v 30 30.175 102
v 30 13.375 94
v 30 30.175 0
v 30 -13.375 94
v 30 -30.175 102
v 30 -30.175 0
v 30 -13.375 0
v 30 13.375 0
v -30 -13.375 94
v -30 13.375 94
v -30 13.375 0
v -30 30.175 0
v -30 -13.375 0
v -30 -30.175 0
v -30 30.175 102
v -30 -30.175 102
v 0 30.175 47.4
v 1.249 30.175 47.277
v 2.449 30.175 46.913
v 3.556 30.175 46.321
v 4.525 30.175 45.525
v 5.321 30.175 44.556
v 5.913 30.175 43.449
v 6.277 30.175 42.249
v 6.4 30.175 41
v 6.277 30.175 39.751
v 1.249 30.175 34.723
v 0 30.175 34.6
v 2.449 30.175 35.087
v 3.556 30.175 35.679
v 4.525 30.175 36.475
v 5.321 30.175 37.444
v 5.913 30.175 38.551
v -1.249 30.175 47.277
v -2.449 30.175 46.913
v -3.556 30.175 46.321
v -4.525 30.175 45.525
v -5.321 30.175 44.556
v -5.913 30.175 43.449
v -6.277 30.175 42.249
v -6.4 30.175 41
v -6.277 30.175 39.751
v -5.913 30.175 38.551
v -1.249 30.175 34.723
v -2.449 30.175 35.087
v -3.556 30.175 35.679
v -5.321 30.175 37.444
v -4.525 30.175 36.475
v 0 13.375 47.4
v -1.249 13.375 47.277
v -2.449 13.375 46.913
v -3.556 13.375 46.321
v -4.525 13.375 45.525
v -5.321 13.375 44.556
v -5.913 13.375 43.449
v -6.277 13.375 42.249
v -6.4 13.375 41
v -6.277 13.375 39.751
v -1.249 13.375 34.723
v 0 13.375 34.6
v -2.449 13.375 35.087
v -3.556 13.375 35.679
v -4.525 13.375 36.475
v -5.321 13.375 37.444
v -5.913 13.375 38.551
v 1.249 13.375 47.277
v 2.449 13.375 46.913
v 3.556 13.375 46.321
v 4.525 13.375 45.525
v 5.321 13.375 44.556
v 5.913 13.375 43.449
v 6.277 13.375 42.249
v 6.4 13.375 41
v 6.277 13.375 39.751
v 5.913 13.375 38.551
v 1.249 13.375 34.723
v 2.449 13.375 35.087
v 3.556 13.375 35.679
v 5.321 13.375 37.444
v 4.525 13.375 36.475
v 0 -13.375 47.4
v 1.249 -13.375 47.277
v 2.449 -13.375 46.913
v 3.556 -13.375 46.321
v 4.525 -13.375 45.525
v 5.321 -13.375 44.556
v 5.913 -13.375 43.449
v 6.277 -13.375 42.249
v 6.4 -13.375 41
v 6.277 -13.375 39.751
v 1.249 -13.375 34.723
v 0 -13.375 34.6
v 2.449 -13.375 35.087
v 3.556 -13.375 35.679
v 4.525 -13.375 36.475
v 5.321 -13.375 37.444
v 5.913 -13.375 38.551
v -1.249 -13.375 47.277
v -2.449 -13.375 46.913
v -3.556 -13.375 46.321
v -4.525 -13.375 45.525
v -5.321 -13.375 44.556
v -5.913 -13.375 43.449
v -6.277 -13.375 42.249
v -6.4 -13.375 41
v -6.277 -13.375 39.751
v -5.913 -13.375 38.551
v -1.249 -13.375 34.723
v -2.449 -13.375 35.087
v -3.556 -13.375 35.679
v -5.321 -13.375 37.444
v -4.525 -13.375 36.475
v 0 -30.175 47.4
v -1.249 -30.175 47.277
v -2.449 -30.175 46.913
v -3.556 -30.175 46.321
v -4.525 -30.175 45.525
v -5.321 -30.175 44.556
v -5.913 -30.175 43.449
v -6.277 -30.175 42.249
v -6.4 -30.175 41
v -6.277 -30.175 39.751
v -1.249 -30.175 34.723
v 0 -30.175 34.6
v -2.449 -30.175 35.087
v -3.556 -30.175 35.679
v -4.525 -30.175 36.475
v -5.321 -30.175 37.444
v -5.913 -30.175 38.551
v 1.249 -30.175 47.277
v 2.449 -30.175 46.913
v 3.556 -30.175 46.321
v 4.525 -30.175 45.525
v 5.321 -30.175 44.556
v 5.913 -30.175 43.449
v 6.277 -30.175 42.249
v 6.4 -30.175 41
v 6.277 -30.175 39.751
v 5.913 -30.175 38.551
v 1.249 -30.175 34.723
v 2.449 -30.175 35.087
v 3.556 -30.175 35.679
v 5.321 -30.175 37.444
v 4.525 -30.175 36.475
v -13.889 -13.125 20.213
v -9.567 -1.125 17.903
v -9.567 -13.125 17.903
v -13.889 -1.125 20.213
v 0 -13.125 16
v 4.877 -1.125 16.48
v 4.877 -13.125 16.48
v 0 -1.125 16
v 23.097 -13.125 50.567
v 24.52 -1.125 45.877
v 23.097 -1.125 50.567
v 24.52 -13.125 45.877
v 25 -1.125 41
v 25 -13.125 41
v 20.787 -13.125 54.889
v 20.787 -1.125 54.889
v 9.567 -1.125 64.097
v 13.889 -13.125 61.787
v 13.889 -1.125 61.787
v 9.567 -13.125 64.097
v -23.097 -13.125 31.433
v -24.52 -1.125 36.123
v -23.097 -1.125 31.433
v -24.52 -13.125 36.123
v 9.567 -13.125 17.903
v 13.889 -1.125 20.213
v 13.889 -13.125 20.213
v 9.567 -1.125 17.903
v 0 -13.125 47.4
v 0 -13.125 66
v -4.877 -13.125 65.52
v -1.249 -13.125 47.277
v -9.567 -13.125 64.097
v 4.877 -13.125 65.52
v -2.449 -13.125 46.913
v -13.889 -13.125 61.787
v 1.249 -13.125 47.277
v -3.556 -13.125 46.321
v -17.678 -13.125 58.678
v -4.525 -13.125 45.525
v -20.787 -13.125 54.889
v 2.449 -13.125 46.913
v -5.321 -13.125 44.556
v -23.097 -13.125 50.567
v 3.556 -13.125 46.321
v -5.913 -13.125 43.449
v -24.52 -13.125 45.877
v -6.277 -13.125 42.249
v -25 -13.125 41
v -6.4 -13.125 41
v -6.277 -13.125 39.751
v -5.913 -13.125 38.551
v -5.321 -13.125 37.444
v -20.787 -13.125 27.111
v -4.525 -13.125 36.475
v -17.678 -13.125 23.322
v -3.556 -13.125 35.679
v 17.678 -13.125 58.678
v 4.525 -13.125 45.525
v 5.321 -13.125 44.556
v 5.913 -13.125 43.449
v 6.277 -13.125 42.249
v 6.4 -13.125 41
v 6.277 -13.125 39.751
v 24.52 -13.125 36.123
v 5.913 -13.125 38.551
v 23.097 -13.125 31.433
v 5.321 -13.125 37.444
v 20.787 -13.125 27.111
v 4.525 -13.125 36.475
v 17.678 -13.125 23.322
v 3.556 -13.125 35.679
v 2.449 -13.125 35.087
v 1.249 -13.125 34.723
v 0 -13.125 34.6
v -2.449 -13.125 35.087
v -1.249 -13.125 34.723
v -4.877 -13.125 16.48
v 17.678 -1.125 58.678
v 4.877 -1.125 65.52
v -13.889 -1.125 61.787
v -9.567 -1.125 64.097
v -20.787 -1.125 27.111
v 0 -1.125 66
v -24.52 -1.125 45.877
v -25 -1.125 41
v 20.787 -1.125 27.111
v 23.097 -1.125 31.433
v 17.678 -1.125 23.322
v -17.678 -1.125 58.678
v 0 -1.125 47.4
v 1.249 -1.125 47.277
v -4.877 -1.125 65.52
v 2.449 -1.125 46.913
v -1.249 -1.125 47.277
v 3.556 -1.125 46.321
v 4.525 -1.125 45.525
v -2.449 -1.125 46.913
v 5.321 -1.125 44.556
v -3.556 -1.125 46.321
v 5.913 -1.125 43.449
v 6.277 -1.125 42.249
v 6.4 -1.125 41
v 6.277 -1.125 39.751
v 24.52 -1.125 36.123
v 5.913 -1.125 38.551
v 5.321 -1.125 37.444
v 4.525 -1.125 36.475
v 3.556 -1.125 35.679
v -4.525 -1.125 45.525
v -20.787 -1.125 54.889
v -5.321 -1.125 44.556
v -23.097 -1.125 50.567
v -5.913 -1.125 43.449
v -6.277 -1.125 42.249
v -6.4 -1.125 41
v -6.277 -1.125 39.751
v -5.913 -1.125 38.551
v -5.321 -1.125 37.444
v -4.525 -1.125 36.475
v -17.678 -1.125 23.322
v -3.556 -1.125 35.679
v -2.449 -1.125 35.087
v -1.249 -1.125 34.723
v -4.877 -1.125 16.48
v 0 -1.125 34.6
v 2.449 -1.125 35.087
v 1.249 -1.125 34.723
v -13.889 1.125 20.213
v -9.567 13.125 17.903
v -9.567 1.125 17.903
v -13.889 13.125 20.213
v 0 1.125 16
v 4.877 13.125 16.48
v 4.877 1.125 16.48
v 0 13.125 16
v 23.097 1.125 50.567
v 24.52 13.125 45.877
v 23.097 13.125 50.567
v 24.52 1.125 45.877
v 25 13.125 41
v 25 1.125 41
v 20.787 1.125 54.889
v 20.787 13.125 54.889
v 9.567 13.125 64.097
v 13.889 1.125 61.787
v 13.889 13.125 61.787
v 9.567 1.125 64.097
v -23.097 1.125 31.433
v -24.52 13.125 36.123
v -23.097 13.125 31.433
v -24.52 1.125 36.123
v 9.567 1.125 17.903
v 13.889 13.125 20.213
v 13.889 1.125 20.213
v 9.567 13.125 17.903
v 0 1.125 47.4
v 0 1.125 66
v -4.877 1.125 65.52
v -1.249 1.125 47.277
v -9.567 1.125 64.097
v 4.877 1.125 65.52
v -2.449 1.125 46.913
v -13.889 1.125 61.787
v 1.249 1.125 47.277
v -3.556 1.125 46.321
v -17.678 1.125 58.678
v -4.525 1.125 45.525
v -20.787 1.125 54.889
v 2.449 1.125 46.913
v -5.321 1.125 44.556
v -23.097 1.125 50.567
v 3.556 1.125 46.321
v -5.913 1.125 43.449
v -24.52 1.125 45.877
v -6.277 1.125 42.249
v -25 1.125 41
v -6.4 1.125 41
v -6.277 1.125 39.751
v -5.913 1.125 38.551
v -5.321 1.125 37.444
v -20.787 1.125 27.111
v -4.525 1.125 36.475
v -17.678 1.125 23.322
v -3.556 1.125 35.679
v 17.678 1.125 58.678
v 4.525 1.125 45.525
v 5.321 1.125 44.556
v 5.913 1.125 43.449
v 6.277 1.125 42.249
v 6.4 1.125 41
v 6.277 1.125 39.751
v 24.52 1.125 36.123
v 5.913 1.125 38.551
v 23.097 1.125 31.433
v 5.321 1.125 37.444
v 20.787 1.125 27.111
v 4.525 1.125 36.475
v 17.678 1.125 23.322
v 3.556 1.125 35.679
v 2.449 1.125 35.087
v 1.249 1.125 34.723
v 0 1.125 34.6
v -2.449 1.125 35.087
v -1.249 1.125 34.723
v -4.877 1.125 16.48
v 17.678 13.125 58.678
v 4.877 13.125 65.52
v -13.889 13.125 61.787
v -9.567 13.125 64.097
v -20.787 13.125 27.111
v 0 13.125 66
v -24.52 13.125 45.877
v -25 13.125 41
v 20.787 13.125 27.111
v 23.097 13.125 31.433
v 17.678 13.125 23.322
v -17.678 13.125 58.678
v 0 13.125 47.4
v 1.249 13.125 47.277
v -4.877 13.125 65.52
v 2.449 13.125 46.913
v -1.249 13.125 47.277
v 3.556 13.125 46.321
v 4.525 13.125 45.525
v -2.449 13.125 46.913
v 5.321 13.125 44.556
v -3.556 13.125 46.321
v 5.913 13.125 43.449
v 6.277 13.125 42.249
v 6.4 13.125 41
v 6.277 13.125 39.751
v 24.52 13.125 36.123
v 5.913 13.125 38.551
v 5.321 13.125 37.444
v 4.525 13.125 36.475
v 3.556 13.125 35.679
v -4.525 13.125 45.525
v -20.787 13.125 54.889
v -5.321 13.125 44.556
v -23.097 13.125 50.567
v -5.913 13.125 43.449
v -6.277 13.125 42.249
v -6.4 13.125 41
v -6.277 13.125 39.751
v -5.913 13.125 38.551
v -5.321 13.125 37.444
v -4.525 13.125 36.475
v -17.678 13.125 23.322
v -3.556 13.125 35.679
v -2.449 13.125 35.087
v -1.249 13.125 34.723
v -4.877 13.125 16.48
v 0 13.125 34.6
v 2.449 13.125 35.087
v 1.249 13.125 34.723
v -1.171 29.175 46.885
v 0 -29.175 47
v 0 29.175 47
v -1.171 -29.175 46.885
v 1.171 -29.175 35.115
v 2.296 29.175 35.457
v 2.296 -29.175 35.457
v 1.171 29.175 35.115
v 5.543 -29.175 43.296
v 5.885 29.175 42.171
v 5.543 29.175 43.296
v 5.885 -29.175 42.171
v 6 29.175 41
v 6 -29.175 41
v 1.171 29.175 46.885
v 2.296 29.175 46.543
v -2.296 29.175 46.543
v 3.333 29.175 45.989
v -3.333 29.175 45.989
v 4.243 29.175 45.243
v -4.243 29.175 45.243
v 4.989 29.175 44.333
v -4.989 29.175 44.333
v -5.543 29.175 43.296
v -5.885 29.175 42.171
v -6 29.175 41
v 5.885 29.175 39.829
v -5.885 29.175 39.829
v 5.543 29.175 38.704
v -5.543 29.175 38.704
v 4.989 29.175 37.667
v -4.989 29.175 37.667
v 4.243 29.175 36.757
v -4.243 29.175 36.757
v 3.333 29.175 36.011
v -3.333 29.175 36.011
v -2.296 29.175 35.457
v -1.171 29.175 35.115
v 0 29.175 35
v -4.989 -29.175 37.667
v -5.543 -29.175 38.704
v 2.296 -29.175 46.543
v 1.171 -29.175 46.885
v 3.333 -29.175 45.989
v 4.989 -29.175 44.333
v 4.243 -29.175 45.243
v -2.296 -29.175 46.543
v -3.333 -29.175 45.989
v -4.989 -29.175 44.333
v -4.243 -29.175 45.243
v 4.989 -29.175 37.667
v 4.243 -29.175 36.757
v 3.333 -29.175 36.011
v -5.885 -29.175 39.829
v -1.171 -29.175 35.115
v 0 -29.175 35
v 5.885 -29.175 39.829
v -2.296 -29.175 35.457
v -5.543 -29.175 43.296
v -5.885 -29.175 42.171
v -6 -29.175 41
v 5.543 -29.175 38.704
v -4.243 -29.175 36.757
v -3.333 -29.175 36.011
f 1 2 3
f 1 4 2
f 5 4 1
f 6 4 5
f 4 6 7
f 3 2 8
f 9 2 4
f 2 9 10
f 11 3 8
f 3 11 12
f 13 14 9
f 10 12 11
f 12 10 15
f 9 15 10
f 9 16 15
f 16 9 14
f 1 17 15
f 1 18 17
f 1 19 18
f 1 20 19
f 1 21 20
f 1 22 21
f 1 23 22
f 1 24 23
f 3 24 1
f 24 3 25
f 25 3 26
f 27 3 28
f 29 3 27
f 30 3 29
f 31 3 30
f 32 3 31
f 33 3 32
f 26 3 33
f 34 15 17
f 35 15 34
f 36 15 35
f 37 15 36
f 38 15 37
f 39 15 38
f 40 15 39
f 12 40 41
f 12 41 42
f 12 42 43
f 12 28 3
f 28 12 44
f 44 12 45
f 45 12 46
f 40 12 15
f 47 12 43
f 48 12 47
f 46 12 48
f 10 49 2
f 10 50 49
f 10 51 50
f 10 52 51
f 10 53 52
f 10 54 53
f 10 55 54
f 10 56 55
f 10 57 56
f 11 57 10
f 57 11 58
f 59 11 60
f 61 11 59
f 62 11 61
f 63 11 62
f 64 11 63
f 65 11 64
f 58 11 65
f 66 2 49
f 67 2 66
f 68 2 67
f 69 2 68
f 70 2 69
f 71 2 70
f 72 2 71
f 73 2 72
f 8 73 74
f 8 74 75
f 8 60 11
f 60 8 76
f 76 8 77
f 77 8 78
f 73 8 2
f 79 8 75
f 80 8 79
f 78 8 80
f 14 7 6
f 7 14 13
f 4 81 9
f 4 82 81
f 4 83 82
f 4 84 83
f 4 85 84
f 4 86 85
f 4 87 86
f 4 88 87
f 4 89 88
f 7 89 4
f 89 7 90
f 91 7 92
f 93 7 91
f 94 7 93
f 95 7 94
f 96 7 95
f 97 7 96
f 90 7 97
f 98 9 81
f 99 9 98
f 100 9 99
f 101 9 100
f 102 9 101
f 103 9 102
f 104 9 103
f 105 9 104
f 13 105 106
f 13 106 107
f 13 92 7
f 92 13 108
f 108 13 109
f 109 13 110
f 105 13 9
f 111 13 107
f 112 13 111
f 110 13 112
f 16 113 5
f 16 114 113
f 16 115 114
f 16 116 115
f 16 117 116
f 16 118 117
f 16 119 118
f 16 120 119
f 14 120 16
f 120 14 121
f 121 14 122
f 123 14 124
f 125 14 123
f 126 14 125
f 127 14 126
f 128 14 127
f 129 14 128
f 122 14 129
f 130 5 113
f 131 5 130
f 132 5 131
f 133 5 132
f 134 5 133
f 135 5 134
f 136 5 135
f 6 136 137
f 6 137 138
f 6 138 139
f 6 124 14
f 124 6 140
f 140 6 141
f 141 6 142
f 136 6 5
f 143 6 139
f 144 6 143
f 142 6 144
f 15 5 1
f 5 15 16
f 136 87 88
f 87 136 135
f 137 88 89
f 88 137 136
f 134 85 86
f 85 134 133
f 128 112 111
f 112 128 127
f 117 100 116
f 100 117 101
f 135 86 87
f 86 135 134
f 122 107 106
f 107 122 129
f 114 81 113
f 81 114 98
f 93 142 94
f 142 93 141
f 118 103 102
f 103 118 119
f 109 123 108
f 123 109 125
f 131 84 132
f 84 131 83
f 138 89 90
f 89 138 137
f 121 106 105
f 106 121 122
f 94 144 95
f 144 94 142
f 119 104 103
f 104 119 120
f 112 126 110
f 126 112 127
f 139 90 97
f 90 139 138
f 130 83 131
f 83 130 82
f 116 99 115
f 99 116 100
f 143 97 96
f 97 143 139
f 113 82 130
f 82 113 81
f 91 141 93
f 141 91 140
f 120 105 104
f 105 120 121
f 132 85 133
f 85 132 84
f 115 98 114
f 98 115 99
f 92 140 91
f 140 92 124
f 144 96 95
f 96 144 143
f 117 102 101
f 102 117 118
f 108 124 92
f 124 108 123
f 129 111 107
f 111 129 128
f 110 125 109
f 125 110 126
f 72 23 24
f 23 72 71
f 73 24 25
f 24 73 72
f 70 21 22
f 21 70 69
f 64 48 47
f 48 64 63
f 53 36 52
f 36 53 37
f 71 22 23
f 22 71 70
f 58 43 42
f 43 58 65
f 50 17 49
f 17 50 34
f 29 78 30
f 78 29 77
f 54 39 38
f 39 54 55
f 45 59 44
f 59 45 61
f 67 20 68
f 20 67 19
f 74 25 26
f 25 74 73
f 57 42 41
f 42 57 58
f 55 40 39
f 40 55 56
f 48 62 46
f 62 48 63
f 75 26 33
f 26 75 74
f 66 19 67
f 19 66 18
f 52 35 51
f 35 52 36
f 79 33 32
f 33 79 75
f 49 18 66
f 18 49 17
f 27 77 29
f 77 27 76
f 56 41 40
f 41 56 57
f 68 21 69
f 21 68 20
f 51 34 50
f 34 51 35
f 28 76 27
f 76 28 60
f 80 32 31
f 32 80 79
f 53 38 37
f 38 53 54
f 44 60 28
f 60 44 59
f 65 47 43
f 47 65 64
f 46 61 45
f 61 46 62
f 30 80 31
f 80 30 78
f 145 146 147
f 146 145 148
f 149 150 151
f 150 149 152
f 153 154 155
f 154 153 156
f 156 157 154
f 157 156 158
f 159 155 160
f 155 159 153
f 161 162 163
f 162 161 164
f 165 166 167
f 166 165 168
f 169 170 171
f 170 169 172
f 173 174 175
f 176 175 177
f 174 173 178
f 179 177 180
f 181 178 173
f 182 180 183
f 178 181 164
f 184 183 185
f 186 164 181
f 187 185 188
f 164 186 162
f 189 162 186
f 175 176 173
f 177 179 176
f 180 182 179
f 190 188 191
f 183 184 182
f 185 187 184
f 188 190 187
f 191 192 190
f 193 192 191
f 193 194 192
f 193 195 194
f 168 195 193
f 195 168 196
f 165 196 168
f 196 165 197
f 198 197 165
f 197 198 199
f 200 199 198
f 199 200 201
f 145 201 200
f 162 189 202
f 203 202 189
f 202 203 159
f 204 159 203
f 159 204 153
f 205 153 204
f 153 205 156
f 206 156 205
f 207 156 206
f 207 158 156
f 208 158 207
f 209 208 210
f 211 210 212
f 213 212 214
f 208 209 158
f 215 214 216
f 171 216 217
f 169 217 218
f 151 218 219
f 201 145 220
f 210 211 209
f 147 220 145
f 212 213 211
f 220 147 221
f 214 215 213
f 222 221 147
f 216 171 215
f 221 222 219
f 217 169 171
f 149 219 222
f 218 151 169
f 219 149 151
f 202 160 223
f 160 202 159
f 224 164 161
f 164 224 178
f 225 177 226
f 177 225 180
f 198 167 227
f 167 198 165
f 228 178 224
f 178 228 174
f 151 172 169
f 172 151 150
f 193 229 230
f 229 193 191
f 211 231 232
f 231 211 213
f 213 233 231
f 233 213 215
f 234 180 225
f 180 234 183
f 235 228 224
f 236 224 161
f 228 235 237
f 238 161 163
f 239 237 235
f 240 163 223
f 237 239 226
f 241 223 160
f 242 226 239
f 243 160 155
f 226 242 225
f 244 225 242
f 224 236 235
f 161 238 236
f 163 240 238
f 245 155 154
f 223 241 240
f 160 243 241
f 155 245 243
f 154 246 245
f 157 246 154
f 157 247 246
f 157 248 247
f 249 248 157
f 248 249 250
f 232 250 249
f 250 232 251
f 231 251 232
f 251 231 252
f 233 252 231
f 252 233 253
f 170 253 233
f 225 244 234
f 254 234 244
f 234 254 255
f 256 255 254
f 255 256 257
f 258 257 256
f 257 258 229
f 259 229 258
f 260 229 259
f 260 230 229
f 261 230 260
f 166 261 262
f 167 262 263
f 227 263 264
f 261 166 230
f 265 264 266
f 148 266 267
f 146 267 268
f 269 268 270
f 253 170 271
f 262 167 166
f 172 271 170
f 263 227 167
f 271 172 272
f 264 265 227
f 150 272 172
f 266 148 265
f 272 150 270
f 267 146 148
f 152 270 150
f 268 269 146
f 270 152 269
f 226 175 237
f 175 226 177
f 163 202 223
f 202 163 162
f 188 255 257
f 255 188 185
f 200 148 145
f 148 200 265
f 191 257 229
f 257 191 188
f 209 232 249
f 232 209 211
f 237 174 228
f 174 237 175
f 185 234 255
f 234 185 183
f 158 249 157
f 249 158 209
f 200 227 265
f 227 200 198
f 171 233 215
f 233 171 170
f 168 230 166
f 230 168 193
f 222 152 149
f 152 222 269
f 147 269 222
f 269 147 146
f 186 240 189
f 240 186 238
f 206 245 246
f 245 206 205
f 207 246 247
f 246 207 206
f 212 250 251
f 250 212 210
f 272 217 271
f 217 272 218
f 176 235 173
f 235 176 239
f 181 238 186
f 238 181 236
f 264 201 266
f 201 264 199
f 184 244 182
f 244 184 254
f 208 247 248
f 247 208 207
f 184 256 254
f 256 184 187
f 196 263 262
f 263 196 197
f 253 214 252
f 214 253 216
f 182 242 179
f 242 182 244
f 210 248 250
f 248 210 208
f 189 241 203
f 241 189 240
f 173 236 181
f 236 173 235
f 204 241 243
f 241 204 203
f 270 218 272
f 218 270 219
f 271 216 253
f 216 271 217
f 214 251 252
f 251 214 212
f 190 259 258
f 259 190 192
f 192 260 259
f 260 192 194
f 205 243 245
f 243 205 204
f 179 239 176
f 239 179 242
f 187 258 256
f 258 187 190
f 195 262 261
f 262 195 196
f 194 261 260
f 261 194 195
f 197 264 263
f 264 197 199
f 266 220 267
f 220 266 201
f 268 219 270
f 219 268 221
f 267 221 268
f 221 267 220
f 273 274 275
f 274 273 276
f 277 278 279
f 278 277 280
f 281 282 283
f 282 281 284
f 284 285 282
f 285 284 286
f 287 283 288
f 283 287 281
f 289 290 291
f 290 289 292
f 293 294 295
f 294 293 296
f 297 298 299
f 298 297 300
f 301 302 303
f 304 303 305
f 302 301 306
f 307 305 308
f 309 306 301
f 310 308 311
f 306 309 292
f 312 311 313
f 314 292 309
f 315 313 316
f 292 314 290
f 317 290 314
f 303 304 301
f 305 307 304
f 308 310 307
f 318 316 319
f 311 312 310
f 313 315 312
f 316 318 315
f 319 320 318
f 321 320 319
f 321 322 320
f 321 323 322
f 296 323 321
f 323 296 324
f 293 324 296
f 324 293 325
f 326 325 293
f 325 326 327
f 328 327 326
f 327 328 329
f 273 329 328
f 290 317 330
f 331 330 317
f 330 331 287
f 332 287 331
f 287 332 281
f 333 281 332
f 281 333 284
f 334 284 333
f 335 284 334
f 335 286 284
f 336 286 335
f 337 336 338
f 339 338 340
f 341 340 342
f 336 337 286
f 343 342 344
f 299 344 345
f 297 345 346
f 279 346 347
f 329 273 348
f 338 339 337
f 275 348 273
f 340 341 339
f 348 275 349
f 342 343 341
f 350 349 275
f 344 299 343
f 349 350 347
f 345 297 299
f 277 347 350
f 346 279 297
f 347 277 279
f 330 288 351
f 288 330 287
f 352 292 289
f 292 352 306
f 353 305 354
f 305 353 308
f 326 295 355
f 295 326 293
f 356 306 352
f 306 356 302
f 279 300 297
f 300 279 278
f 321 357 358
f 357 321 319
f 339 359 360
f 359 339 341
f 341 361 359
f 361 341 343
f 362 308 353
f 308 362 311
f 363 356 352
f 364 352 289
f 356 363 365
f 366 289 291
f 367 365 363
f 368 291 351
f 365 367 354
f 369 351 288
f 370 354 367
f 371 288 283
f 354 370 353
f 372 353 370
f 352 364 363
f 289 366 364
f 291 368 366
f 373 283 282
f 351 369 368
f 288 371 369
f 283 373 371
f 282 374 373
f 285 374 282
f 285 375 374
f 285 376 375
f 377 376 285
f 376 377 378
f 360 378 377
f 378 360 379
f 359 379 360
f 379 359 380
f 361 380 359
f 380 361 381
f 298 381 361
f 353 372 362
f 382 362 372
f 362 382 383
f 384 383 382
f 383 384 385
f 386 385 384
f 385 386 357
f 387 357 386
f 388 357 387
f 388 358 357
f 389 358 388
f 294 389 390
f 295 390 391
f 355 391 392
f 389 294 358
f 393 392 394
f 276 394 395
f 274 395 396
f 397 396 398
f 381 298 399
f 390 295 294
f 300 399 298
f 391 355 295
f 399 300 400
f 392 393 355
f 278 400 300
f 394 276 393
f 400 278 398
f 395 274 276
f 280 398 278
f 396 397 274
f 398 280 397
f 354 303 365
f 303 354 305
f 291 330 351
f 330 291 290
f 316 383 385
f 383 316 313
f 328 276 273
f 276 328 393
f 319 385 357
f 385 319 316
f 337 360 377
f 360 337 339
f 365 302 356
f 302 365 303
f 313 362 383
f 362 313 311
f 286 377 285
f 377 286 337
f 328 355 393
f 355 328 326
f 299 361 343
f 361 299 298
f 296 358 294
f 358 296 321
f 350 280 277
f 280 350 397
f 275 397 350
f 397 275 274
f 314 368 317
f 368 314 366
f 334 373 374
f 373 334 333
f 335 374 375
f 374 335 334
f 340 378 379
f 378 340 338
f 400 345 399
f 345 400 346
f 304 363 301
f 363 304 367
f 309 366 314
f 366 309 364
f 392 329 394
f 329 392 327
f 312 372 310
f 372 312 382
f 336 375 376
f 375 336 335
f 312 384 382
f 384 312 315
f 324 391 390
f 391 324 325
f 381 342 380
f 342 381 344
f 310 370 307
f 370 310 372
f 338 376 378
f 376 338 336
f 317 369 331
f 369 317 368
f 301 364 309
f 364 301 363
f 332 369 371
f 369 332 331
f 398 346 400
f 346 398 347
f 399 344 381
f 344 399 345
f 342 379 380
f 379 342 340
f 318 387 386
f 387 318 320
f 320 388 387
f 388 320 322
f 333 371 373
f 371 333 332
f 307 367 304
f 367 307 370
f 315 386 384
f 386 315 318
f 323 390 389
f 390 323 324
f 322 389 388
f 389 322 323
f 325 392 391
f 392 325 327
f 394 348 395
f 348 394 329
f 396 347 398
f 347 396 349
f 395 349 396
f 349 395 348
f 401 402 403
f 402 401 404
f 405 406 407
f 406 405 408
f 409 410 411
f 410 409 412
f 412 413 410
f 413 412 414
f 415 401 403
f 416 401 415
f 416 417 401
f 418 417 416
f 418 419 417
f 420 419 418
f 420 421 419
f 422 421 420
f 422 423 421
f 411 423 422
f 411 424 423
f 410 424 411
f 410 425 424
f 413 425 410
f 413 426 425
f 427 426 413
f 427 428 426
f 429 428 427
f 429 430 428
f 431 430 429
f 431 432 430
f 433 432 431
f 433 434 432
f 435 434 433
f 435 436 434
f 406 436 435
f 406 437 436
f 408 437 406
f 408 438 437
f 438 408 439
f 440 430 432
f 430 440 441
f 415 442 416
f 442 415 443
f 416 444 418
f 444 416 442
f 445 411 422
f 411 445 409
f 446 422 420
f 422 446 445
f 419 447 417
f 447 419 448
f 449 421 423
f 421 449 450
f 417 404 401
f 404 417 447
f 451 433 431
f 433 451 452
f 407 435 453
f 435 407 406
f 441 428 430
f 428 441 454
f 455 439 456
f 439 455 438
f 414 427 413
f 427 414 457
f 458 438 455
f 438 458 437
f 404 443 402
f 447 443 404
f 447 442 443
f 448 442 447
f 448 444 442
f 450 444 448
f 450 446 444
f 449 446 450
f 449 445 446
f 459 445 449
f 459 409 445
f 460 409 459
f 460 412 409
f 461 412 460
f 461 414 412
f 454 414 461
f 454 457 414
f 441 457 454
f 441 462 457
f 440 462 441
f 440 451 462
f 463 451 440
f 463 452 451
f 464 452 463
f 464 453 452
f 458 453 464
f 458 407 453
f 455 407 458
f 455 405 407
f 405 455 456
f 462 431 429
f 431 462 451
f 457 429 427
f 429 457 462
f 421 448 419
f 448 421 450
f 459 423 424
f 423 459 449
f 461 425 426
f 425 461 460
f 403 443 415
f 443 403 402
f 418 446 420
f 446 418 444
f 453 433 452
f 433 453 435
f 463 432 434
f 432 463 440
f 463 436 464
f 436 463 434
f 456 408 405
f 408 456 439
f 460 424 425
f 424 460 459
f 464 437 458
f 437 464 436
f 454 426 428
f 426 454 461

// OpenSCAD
$fn = 32;

// ------------------------------------------------------------------------
// Trolley wheel set: wheels d50, fork 94 mm tall
// Every part is its own module, assembly() places every instance.
// ------------------------------------------------------------------------

// --- part 1 ---
module trolley_fork() {
  difference() {
    union() {
      translate([-30, 13.375, 0]) cube([60, 16.8, 94]);
      translate([-30, -30.175, 0]) cube([60, 16.8, 94]);
      translate([-30, -30.175, 94]) cube([60, 60.35, 8]);
    }
    translate([0, -21.775, 41]) rotate([90, 0, 0]) cylinder(h = 18.8, d = 12.8, center = true);
    translate([0, 21.775, 41]) rotate([90, 0, 0]) cylinder(h = 18.8, d = 12.8, center = true);
  }
}

// --- part 2 ---
module trolley_wheel() {
  difference() {
      translate([0, 0, 0]) cylinder(h = 12, d = 50);
      translate([0, 0, -1]) cylinder(h = 14, d = 12.8);
    }
}

// --- part 3 ---
module trolley_axle() {
  translate([0, 0, -29.175]) cylinder(h = 58.35, d = 12);
}

// --- assembly ---
module assembly() {
  color([0.80, 0.24, 0.20]) translate([0, 0, 0]) rotate([0, 0, 0]) trolley_fork();
  color([0.20, 0.45, 0.75]) translate([0, -1.125, 41]) rotate([90, 0, 0]) trolley_wheel();
  color([0.25, 0.62, 0.32]) translate([0, 13.125, 41]) rotate([90, 0, 0]) trolley_wheel();
  color([0.92, 0.70, 0.18]) translate([0, 0, 41]) rotate([90, 0, 0]) trolley_axle();
}

assembly();
